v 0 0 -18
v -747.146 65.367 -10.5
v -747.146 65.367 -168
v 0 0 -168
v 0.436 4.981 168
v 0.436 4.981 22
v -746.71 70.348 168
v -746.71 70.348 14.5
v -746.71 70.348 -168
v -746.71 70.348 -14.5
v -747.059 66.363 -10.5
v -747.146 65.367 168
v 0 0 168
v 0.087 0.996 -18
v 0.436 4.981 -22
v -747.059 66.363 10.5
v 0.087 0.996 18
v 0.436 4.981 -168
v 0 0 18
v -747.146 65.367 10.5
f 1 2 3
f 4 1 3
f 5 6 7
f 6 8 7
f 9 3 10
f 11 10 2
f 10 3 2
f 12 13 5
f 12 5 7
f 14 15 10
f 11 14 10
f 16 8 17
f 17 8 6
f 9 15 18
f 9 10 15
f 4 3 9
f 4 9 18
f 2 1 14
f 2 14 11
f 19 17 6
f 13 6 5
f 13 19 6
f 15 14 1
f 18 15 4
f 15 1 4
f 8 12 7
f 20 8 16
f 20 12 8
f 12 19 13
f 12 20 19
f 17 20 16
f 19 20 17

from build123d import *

# Parameters (mm, degrees)
BOSS_EXTRUDE1_DEPTH   = 5
BOSS_EXTRUDE1_2_DEPTH = 5
CHAMFER1_SIZE         = 4
CHAMFER2_SIZE         = 4


with BuildPart() as part:
    # Sketch2 → Boss-Extrude1 (new body)
    with BuildSketch(Plane(origin=(0, 0, 0), x_dir=(0, 0, 1), z_dir=(-0.08715574274765155, -0.9961946980917461, 0))):
        Polygon((-12, 600), (-18, 0), (-168, 0), (-168, 600), (-168, 750), (-10.5, 750), align=None)
    extrude(amount=-BOSS_EXTRUDE1_DEPTH)

    # Chamfer1
    chamfer1_edges = [part.edges().sort_by_distance(p)[0] for p in [
        (-373.137233071, 37.664377021, -14.25),
    ]]
    chamfer(chamfer1_edges, length=CHAMFER1_SIZE)


with BuildPart() as body_2:
    # Sketch2 → Boss-Extrude1 2 (new body)
    with BuildSketch(Plane(origin=(0, 0, 0), x_dir=(0, 0, 1), z_dir=(-0.08715574274765155, -0.9961946980917461, 0))):
        Polygon((12, 600), (18, 0), (168, 0), (168, 600), (168, 750), (10.5, 750), align=None)
    extrude(amount=-BOSS_EXTRUDE1_2_DEPTH)

    # Chamfer2
    chamfer2_edges = [body_2.edges().sort_by_distance(p)[0] for p in [
        (-373.137233071, 37.664377021, 14.25),
    ]]
    chamfer(chamfer2_edges, length=CHAMFER2_SIZE)


solid = Compound([part.part, body_2.part])
